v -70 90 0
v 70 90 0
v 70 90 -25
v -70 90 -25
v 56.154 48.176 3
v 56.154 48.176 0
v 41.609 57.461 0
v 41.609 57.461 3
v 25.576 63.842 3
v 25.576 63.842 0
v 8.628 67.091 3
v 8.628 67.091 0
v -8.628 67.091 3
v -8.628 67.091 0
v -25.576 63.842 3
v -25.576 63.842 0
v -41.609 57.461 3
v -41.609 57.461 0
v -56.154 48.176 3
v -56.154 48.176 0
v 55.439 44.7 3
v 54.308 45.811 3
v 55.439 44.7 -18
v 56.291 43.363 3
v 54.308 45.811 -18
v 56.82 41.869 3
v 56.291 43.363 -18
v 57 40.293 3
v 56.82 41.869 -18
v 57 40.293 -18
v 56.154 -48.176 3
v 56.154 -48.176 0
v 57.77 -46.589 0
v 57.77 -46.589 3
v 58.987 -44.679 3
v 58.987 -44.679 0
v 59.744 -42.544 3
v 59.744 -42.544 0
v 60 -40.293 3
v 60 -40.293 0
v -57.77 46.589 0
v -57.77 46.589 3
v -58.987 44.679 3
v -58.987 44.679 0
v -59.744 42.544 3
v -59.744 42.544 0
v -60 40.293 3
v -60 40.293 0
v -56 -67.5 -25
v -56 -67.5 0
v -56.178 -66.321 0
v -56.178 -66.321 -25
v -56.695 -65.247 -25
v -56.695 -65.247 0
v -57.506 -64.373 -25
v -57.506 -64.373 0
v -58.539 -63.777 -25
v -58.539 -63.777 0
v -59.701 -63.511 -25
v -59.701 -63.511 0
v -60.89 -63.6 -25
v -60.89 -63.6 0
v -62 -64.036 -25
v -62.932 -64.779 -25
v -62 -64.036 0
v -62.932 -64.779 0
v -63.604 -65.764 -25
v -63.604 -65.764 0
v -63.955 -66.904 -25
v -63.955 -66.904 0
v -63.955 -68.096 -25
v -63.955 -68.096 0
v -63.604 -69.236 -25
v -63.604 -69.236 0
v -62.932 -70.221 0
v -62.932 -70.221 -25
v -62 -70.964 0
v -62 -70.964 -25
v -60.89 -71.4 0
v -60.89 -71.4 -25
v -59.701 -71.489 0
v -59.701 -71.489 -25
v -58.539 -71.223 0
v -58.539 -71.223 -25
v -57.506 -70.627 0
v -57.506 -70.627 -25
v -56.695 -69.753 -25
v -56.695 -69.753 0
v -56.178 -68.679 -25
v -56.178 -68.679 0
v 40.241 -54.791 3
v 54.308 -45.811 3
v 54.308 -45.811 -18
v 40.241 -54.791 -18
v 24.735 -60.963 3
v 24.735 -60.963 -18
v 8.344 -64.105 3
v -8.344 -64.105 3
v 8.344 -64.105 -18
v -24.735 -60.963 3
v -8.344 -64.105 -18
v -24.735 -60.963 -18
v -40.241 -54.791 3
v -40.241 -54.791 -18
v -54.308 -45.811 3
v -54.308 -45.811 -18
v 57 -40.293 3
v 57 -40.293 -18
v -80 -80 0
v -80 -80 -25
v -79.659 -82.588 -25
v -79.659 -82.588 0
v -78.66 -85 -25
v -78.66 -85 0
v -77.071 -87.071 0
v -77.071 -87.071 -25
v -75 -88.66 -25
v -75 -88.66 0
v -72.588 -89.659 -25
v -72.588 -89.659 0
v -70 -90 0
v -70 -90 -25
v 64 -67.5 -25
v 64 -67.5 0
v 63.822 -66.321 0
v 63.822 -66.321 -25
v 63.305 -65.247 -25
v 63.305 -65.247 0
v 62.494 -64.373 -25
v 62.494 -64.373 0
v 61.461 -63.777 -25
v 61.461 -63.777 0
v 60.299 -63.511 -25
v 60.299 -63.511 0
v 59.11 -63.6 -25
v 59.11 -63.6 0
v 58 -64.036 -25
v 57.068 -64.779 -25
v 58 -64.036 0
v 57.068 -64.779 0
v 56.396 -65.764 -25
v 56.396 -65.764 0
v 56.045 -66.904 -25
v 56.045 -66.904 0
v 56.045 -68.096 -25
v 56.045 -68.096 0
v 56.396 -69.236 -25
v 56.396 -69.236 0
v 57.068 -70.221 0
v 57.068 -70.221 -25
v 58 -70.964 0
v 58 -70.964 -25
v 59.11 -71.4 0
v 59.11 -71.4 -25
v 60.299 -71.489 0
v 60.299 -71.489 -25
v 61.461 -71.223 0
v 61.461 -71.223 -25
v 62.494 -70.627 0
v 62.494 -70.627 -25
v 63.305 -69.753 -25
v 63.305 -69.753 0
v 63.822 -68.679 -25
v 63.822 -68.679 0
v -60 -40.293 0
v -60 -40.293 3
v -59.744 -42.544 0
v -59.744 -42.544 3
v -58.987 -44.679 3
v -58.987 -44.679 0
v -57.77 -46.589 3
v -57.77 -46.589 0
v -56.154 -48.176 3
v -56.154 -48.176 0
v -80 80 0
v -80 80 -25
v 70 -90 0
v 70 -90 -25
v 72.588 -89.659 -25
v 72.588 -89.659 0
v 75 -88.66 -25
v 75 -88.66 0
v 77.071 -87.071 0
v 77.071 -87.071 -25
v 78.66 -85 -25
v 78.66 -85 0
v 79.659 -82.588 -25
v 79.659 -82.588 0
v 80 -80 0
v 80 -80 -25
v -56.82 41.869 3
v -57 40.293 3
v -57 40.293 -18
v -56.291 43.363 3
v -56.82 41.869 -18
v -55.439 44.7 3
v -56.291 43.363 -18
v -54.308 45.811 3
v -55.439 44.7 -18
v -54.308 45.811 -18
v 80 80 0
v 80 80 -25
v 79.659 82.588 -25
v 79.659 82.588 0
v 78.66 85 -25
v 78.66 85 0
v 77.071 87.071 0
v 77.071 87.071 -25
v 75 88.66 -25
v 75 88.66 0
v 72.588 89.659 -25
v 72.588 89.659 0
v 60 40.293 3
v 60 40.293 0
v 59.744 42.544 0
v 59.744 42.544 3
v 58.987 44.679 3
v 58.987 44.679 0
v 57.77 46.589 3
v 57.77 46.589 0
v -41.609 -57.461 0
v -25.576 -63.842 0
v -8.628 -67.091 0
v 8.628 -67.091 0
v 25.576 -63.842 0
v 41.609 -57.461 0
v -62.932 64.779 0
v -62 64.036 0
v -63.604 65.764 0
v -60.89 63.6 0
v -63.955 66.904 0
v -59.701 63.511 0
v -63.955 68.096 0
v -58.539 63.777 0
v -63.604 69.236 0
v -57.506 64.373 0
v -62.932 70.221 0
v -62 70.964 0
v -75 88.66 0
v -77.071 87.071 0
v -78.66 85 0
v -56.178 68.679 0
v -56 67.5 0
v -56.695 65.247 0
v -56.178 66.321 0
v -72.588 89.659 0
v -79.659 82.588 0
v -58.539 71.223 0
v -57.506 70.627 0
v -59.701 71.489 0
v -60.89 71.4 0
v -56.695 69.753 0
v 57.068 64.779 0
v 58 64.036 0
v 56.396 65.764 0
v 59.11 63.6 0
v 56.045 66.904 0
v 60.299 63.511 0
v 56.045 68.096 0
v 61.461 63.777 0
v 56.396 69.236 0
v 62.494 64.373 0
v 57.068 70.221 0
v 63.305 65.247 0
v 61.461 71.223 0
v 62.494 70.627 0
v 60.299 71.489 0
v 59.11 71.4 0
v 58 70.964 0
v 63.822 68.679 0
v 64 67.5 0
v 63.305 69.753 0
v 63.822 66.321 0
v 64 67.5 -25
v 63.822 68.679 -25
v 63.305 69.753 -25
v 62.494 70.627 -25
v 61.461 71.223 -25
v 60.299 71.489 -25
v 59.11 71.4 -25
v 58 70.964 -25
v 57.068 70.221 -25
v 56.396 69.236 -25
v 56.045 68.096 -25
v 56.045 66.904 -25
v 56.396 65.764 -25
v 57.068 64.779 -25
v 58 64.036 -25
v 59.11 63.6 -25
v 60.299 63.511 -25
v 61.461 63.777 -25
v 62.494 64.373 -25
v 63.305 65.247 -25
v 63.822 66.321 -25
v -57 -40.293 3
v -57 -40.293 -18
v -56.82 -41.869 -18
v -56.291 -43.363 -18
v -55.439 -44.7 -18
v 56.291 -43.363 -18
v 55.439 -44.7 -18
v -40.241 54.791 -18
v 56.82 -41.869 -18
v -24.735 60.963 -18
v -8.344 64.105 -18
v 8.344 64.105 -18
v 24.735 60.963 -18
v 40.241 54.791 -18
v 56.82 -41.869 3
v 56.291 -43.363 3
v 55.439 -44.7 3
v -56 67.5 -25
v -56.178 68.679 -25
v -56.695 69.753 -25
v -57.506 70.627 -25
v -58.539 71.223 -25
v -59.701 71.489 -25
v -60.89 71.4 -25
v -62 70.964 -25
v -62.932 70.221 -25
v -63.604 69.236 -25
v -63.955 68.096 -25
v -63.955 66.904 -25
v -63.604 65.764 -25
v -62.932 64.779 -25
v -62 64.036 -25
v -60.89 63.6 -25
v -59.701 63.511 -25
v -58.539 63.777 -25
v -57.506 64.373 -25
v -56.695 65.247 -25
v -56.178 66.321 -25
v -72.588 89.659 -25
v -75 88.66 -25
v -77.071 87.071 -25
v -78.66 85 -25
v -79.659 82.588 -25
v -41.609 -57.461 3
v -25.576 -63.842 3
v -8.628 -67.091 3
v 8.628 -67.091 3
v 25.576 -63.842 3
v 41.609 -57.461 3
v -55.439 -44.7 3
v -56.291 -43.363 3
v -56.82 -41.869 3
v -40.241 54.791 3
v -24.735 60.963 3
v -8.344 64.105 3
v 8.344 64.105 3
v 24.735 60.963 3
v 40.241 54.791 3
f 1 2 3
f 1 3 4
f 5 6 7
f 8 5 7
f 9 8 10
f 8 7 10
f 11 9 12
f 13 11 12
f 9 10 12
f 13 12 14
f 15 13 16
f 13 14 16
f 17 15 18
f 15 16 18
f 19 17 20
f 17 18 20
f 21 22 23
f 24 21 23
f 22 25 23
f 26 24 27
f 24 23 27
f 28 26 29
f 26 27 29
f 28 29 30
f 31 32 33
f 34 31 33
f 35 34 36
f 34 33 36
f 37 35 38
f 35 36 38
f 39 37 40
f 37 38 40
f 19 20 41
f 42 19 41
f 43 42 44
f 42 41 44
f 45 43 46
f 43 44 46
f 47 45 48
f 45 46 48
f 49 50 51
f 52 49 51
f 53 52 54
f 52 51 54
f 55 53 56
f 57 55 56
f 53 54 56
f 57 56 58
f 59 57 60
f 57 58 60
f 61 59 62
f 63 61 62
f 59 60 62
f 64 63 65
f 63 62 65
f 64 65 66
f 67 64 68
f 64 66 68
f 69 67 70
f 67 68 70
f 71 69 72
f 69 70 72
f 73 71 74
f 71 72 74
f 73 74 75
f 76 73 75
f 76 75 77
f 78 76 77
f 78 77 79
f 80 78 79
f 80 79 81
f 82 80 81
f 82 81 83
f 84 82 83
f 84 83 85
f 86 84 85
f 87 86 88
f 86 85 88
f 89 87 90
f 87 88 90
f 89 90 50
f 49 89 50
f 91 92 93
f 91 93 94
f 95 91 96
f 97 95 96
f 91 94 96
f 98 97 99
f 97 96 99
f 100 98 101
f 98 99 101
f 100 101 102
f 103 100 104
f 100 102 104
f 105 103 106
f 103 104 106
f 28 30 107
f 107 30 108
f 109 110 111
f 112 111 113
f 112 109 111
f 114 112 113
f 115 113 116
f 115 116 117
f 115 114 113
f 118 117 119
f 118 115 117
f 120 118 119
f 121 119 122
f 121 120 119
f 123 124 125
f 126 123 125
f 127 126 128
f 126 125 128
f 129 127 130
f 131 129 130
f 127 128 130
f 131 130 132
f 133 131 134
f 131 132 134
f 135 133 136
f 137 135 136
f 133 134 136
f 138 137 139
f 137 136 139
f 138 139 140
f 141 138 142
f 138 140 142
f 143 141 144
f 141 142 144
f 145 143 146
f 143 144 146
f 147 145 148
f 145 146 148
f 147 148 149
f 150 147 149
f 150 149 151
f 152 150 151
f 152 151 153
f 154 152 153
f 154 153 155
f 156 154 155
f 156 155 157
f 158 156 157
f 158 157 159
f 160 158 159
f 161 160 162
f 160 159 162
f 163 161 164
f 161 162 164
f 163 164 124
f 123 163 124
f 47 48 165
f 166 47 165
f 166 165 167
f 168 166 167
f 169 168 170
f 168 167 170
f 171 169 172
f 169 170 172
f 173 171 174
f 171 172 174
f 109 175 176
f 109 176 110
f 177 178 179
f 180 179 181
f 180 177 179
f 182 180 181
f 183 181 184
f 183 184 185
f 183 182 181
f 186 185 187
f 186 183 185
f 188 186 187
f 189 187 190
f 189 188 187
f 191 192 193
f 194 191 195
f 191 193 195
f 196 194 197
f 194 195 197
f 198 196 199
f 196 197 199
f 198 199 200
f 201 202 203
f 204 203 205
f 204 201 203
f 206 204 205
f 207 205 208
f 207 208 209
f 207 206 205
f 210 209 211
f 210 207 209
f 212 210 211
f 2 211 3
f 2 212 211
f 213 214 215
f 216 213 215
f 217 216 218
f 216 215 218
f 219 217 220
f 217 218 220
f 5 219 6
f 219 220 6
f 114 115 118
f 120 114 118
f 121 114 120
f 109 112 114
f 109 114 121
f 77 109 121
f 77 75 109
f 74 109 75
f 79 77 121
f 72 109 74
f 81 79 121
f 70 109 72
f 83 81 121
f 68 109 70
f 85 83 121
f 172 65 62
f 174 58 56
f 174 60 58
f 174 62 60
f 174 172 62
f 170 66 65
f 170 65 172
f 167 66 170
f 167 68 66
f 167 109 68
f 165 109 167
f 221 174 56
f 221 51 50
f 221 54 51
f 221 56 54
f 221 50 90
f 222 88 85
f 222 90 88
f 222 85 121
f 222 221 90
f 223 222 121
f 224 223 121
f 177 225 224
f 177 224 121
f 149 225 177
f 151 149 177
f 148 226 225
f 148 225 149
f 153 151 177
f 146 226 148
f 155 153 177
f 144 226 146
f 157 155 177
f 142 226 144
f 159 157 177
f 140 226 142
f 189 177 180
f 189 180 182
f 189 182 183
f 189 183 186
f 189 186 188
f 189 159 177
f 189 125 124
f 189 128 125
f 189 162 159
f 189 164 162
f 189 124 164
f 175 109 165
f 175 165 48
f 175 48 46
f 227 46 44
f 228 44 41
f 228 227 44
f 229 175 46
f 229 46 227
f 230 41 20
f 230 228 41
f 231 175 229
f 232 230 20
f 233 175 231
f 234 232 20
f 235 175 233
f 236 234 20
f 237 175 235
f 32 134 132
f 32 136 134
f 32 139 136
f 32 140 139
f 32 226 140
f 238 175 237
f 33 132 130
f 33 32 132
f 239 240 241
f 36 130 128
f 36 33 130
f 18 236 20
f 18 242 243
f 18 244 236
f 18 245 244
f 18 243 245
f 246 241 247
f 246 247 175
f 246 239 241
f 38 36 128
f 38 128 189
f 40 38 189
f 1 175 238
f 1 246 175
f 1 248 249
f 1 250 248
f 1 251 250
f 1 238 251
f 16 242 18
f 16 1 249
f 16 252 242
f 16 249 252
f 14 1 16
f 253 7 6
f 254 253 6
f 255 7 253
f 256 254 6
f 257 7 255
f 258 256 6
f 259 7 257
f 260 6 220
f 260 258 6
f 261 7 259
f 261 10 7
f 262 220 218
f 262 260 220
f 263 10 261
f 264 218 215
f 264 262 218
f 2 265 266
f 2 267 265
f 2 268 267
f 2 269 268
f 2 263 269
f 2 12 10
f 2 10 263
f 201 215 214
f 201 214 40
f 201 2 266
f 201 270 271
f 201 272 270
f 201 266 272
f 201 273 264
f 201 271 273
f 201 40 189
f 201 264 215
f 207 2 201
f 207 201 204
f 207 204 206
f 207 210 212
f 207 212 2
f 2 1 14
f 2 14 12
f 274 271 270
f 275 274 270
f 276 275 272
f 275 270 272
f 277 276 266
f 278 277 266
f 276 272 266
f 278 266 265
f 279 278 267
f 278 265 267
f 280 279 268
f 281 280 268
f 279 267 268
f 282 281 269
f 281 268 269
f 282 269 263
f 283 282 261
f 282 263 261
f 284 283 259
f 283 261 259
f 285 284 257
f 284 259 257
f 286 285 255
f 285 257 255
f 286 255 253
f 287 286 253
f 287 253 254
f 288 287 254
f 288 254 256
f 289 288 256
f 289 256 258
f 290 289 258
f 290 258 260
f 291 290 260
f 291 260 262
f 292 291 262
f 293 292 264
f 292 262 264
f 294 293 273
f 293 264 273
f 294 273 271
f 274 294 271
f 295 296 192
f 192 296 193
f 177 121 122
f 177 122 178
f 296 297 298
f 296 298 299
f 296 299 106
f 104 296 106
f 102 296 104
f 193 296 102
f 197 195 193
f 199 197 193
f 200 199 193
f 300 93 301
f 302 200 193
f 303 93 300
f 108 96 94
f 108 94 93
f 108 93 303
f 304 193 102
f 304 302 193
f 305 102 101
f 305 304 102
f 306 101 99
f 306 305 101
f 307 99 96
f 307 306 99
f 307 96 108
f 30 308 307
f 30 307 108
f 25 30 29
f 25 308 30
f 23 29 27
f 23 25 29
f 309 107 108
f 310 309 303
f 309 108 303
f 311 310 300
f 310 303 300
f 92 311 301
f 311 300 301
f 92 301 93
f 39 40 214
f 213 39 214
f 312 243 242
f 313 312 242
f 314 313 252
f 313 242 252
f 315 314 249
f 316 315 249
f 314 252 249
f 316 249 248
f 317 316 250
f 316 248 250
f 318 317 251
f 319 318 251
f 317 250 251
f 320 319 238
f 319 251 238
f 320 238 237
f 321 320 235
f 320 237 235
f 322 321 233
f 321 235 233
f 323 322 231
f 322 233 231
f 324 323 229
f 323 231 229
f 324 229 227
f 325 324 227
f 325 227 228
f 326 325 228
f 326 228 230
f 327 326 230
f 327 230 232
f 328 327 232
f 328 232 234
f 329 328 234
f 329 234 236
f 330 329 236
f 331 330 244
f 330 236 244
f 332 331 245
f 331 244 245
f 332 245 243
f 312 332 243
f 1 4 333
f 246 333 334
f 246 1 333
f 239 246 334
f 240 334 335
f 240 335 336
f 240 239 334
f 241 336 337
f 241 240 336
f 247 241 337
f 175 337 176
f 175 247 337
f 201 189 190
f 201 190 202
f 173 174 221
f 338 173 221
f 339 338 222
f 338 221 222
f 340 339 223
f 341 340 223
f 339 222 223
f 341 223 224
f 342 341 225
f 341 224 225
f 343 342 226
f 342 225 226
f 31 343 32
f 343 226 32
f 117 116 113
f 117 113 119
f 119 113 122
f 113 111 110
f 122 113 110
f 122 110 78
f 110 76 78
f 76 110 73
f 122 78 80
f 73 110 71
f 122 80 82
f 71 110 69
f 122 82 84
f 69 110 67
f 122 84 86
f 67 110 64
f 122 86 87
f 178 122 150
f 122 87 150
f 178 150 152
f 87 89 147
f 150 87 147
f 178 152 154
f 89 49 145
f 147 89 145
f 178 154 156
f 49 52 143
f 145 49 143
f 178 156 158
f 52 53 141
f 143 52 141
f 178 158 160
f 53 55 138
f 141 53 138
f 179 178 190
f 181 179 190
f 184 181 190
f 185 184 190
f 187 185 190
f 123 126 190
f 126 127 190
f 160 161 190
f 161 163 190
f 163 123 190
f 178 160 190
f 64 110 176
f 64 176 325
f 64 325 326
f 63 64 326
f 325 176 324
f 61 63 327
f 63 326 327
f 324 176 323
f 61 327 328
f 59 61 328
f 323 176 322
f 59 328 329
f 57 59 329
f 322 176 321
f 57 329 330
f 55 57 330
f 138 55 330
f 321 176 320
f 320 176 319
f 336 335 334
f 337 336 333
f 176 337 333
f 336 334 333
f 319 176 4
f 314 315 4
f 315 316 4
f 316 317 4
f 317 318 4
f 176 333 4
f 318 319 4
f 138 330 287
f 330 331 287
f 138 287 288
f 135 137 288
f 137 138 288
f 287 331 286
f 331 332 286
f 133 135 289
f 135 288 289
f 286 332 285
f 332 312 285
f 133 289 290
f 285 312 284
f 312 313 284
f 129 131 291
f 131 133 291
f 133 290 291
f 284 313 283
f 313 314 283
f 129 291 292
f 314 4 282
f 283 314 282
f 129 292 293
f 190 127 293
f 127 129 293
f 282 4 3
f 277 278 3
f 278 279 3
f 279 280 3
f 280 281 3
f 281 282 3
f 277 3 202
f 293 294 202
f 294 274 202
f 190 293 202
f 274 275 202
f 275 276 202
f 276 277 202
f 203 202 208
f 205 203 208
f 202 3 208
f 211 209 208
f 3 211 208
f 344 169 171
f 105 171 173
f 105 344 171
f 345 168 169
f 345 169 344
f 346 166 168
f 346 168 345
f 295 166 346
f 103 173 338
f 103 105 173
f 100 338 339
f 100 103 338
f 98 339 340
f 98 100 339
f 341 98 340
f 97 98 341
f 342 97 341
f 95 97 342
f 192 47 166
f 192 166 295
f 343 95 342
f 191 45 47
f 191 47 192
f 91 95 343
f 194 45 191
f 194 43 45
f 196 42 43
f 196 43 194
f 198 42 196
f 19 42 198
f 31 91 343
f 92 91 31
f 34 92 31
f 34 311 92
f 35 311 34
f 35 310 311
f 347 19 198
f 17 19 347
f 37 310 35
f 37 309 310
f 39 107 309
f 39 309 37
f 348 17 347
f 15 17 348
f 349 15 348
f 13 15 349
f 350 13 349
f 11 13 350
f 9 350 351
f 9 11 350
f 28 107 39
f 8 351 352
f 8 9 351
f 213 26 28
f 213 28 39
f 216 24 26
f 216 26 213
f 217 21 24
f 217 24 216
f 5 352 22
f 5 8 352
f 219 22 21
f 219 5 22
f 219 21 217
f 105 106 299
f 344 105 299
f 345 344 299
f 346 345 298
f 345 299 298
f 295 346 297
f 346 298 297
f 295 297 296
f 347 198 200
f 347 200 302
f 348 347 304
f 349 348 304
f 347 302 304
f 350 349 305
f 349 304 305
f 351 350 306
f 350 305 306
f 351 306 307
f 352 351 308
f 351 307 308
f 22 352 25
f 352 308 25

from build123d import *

# Parameters (mm, degrees)
F0_R     = 4
F1_DEPTH = 25
F2_DEPTH = 3
F3_DEPTH = 18


with BuildPart() as f1:
    # F0 (on Top) → F1 (new body)
    with BuildSketch(Plane.XY):
        with BuildLine():
            ThreePointArc((-80, -80), (-77.0710678119, -87.0710678119), (-70, -90))
            Line((-70, -90), (70, -90))
            ThreePointArc((70, -90), (77.0710678119, -87.0710678119), (80, -80))
            Line((80, -80), (80, 80))
            ThreePointArc((80, 80), (77.0710678119, 87.0710678119), (70, 90))
            Line((70, 90), (-70, 90))
            ThreePointArc((-70, 90), (-77.0710678119, 87.0710678119), (-80, 80))
            Line((-80, 80), (-80, -80))
        make_face()
        with Locations((-60, -67.5)):
            Circle(F0_R, mode=Mode.SUBTRACT)
        with Locations((60, -67.5)):
            Circle(F0_R, mode=Mode.SUBTRACT)
        with Locations((-60, 67.5)):
            Circle(F0_R, mode=Mode.SUBTRACT)
        with BuildLine():
            ThreePointArc((-64, 40.2934422872), (-62.5820384798, 46.4328484224), (-58.6153846154, 51.3286200352))
            ThreePointArc((-58.6153846154, 51.3286200352), (0, 71.5), (58.6153846154, 51.3286200352))
            ThreePointArc((58.6153846154, 51.3286200352), (62.5820384798, 46.4328484224), (64, 40.2934422872))
            Line((64, 40.2934422872), (64, -40.2934422872))
            ThreePointArc((64, -40.2934422872), (62.5820384798, -46.4328484224), (58.6153846154, -51.3286200352))
            ThreePointArc((58.6153846154, -51.3286200352), (0, -71.5), (-58.6153846154, -51.3286200352))
            ThreePointArc((-58.6153846154, -51.3286200352), (-62.5820384798, -46.4328484224), (-64, -40.2934422872))
            Line((-64, -40.2934422872), (-64, 40.2934422872))
        make_face(mode=Mode.SUBTRACT)
        with Locations((60, 67.5)):
            Circle(F0_R, mode=Mode.SUBTRACT)
        with BuildLine():
            ThreePointArc((58.6153846154, 51.3286200352), (0, 71.5), (-58.6153846154, 51.3286200352))
            ThreePointArc((-58.6153846154, 51.3286200352), (-62.5820384798, 46.4328484224), (-64, 40.2934422872))
            Line((-64, 40.2934422872), (-64, -40.2934422872))
            ThreePointArc((-64, -40.2934422872), (-62.5820384798, -46.4328484224), (-58.6153846154, -51.3286200352))
            ThreePointArc((-58.6153846154, -51.3286200352), (0, -71.5), (58.6153846154, -51.3286200352))
            ThreePointArc((58.6153846154, -51.3286200352), (62.5820384798, -46.4328484224), (64, -40.2934422872))
            Line((64, -40.2934422872), (64, 40.2934422872))
            ThreePointArc((64, 40.2934422872), (62.5820384798, 46.4328484224), (58.6153846154, 51.3286200352))
        make_face()
        with BuildLine():
            Line((-60, -40.2934422872), (-60, 40.2934422872))
            ThreePointArc((-60, 40.2934422872), (-58.9871703427, 44.6787323838), (-56.1538461538, 48.1757121072))
            ThreePointArc((-56.1538461538, 48.1757121072), (0, 67.5), (56.1538461538, 48.1757121072))
            ThreePointArc((56.1538461538, 48.1757121072), (58.9871703427, 44.6787323838), (60, 40.2934422872))
            Line((60, 40.2934422872), (60, -40.2934422872))
            ThreePointArc((60, -40.2934422872), (58.9871703427, -44.6787323838), (56.1538461538, -48.1757121072))
            ThreePointArc((56.1538461538, -48.1757121072), (0, -67.5), (-56.1538461538, -48.1757121072))
            ThreePointArc((-56.1538461538, -48.1757121072), (-58.9871703427, -44.6787323838), (-60, -40.2934422872))
        make_face(mode=Mode.SUBTRACT)
        with BuildLine():
            ThreePointArc((-56.1538461538, 48.1757121072), (-58.9871703427, 44.6787323838), (-60, 40.2934422872))
            Line((-60, 40.2934422872), (-60, -40.2934422872))
            ThreePointArc((-60, -40.2934422872), (-58.9871703427, -44.6787323838), (-56.1538461538, -48.1757121072))
            ThreePointArc((-56.1538461538, -48.1757121072), (0, -67.5), (56.1538461538, -48.1757121072))
            ThreePointArc((56.1538461538, -48.1757121072), (58.9871703427, -44.6787323838), (60, -40.2934422872))
            Line((60, -40.2934422872), (60, 40.2934422872))
            ThreePointArc((60, 40.2934422872), (58.9871703427, 44.6787323838), (56.1538461538, 48.1757121072))
            ThreePointArc((56.1538461538, 48.1757121072), (0, 67.5), (-56.1538461538, 48.1757121072))
        make_face()
        with BuildLine():
            ThreePointArc((54.3076923077, 45.8110311612), (56.2910192399, 43.3631453548), (57, 40.2934422872))
            Line((57, 40.2934422872), (57, -40.2934422872))
            ThreePointArc((57, -40.2934422872), (56.2910192399, -43.3631453548), (54.3076923077, -45.8110311612))
            ThreePointArc((54.3076923077, -45.8110311612), (0, -64.5), (-54.3076923077, -45.8110311612))
            ThreePointArc((-54.3076923077, -45.8110311612), (-56.2910192399, -43.3631453548), (-57, -40.2934422872))
            Line((-57, -40.2934422872), (-57, 40.2934422872))
            ThreePointArc((-57, 40.2934422872), (-56.2910192399, 43.3631453548), (-54.3076923077, 45.8110311612))
            ThreePointArc((-54.3076923077, 45.8110311612), (0, 64.5), (54.3076923077, 45.8110311612))
        make_face(mode=Mode.SUBTRACT)
        with BuildLine():
            Line((57, -40.2934422872), (57, 40.2934422872))
            ThreePointArc((57, 40.2934422872), (56.2910192399, 43.3631453548), (54.3076923077, 45.8110311612))
            ThreePointArc((54.3076923077, 45.8110311612), (0, 64.5), (-54.3076923077, 45.8110311612))
            ThreePointArc((-54.3076923077, 45.8110311612), (-56.2910192399, 43.3631453548), (-57, 40.2934422872))
            Line((-57, 40.2934422872), (-57, -40.2934422872))
            ThreePointArc((-57, -40.2934422872), (-56.2910192399, -43.3631453548), (-54.3076923077, -45.8110311612))
            ThreePointArc((-54.3076923077, -45.8110311612), (0, -64.5), (54.3076923077, -45.8110311612))
            ThreePointArc((54.3076923077, -45.8110311612), (56.2910192399, -43.3631453548), (57, -40.2934422872))
        make_face()
    extrude(amount=-F1_DEPTH)

    # F0 (on Top) → F2 (join)
    with BuildSketch(Plane.XY):
        with BuildLine():
            ThreePointArc((-56.1538461538, 48.1757121072), (-58.9871703427, 44.6787323838), (-60, 40.2934422872))
            Line((-60, 40.2934422872), (-60, -40.2934422872))
            ThreePointArc((-60, -40.2934422872), (-58.9871703427, -44.6787323838), (-56.1538461538, -48.1757121072))
            ThreePointArc((-56.1538461538, -48.1757121072), (0, -67.5), (56.1538461538, -48.1757121072))
            ThreePointArc((56.1538461538, -48.1757121072), (58.9871703427, -44.6787323838), (60, -40.2934422872))
            Line((60, -40.2934422872), (60, 40.2934422872))
            ThreePointArc((60, 40.2934422872), (58.9871703427, 44.6787323838), (56.1538461538, 48.1757121072))
            ThreePointArc((56.1538461538, 48.1757121072), (0, 67.5), (-56.1538461538, 48.1757121072))
        make_face()
        with BuildLine():
            ThreePointArc((54.3076923077, 45.8110311612), (56.2910192399, 43.3631453548), (57, 40.2934422872))
            Line((57, 40.2934422872), (57, -40.2934422872))
            ThreePointArc((57, -40.2934422872), (56.2910192399, -43.3631453548), (54.3076923077, -45.8110311612))
            ThreePointArc((54.3076923077, -45.8110311612), (0, -64.5), (-54.3076923077, -45.8110311612))
            ThreePointArc((-54.3076923077, -45.8110311612), (-56.2910192399, -43.3631453548), (-57, -40.2934422872))
            Line((-57, -40.2934422872), (-57, 40.2934422872))
            ThreePointArc((-57, 40.2934422872), (-56.2910192399, 43.3631453548), (-54.3076923077, 45.8110311612))
            ThreePointArc((-54.3076923077, 45.8110311612), (0, 64.5), (54.3076923077, 45.8110311612))
        make_face(mode=Mode.SUBTRACT)
    extrude(amount=F2_DEPTH)

    # F0 (on Top) → F3 (cut)
    with BuildSketch(Plane.XY):
        with BuildLine():
            Line((57, -40.2934422872), (57, 40.2934422872))
            ThreePointArc((57, 40.2934422872), (56.2910192399, 43.3631453548), (54.3076923077, 45.8110311612))
            ThreePointArc((54.3076923077, 45.8110311612), (0, 64.5), (-54.3076923077, 45.8110311612))
            ThreePointArc((-54.3076923077, 45.8110311612), (-56.2910192399, 43.3631453548), (-57, 40.2934422872))
            Line((-57, 40.2934422872), (-57, -40.2934422872))
            ThreePointArc((-57, -40.2934422872), (-56.2910192399, -43.3631453548), (-54.3076923077, -45.8110311612))
            ThreePointArc((-54.3076923077, -45.8110311612), (0, -64.5), (54.3076923077, -45.8110311612))
            ThreePointArc((54.3076923077, -45.8110311612), (56.2910192399, -43.3631453548), (57, -40.2934422872))
        make_face()
    extrude(amount=-F3_DEPTH, mode=Mode.SUBTRACT)


solid = f1.part
